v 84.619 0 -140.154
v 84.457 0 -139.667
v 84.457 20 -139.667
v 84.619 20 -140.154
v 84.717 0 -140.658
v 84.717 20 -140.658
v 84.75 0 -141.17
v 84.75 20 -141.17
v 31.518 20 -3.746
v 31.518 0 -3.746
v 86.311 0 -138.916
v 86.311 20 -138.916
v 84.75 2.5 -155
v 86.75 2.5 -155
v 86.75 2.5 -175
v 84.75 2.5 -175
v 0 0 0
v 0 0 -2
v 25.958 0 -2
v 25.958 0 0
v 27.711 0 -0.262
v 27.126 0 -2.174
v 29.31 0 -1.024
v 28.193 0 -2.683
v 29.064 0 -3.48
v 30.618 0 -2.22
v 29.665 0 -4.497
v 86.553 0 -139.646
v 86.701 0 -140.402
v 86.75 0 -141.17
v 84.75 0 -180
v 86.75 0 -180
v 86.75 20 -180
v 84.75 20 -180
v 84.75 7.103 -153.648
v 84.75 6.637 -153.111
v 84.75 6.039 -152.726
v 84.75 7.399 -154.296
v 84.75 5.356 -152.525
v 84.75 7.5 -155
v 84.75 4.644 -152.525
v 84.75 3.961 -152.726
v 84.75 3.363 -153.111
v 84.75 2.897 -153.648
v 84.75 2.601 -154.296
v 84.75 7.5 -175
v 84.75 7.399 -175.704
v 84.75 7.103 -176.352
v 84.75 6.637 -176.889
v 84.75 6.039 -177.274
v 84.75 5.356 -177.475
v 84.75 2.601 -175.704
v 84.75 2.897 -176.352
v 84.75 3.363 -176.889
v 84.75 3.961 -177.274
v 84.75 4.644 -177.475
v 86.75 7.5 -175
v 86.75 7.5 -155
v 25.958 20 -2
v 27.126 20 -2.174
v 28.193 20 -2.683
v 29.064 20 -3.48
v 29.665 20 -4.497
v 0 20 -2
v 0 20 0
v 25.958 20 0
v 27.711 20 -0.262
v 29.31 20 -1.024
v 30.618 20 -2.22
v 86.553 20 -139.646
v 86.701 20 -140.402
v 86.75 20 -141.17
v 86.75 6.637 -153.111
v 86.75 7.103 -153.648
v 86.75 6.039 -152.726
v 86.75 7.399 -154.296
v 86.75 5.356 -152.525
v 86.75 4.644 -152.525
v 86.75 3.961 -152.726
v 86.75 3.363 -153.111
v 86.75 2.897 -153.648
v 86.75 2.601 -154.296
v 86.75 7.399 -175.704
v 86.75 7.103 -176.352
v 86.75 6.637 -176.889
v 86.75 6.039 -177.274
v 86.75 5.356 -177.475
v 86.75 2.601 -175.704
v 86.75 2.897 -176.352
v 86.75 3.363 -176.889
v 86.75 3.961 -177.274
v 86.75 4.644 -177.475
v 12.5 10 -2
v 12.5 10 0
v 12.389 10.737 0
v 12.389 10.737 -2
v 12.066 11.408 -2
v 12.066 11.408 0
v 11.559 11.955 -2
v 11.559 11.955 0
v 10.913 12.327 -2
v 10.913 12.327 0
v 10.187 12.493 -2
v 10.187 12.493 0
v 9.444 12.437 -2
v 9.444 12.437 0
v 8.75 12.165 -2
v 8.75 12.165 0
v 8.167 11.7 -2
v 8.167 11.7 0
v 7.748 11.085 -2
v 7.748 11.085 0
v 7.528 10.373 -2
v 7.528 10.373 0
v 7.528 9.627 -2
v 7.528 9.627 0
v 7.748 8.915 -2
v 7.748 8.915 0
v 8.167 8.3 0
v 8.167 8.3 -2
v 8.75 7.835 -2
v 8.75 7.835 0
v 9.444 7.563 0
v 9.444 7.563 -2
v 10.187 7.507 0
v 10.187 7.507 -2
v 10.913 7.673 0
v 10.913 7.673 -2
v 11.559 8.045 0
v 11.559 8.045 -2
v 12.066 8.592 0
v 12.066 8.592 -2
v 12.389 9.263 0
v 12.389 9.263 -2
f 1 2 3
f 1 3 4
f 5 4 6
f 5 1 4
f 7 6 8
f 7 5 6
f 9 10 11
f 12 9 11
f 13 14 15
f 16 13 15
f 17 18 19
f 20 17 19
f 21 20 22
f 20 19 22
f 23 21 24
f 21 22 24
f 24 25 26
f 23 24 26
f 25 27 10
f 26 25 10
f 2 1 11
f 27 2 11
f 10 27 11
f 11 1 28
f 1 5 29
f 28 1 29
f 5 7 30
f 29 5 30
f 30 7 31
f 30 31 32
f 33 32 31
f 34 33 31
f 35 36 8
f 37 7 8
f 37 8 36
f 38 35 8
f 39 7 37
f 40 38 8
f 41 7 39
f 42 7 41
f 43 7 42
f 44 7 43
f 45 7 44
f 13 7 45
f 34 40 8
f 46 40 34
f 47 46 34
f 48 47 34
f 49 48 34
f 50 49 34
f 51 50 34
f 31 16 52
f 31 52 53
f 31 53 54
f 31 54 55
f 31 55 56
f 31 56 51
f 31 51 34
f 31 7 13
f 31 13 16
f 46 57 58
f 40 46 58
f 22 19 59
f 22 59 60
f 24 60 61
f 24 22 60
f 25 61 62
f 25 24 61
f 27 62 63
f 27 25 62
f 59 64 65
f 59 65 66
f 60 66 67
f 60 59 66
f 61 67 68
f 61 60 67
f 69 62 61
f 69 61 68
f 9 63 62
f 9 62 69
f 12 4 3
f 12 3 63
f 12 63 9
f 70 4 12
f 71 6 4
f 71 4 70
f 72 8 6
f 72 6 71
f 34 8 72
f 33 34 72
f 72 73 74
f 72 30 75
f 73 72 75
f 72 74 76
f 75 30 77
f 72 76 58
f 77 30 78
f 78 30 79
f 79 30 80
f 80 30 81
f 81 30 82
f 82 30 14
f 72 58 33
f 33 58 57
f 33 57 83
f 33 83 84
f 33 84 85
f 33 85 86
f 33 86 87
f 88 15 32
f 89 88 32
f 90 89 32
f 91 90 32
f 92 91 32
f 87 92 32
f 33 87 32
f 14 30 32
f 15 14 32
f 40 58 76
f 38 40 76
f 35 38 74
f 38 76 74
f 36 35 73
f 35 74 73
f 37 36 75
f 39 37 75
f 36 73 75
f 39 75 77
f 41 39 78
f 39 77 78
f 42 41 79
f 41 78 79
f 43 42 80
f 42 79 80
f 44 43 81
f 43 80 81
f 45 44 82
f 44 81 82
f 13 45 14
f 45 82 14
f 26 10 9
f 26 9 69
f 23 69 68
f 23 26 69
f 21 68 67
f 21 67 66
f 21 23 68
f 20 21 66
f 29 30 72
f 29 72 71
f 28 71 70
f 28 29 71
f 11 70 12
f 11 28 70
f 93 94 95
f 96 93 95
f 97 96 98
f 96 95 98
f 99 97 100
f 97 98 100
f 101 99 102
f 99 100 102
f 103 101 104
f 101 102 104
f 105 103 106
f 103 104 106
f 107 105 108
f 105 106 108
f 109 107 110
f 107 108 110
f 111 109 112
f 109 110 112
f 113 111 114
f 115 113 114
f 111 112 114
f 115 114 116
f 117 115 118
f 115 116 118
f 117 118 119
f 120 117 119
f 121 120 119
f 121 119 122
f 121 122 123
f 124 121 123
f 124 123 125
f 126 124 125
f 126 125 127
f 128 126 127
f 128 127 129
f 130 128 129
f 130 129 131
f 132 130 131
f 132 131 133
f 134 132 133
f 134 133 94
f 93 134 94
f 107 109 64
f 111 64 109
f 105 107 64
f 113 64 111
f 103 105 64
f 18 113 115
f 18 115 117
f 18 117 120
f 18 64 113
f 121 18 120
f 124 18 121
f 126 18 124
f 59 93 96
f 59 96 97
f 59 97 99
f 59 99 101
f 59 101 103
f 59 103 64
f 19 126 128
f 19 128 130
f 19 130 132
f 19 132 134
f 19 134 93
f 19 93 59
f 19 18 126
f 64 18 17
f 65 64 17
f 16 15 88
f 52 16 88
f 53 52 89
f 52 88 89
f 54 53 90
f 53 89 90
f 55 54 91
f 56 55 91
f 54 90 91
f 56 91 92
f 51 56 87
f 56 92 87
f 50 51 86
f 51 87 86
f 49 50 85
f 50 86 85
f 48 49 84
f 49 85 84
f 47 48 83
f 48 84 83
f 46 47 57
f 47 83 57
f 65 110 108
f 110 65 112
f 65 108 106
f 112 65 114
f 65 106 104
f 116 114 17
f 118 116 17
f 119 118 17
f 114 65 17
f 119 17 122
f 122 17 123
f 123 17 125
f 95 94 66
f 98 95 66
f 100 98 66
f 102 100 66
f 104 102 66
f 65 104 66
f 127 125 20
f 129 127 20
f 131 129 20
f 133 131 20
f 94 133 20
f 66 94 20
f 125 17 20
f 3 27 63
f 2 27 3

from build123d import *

# Parameters (mm, degrees)
BOSS_EXTRUDE1_DEPTH  = 20
CONVERT_SOLID2_DEPTH = 20
SKETCH8_R            = 2.5
CUT_EXTRUDE1_DEPTH   = 20
CUT_EXTRUDE2_DEPTH   = 10


# Read off the part's stored shape, not the designer's step: Convert-Solid2
with BuildPart() as part:
    # Sketch1 → Boss-Extrude1 (new body)
    with BuildSketch(Plane(origin=(0, 0, 0), x_dir=(1, 0, 0), z_dir=(0, 1, 0))):
        Polygon((0, 0), (30, 0), (86.75, 140), (86.75, 180), (81.75, 180), (81.75, 140.974868952), (26.631615621, 5), (0, 5), align=None)
    extrude(amount=BOSS_EXTRUDE1_DEPTH)

    # Convert-Solid2 outline → Convert-Solid2 (cut)
    with BuildSketch(Plane(origin=(0, 0, 0), x_dir=(1, 0, 0), z_dir=(0, 1, 0))):
        with BuildLine():
            Line((30, 0), (31.51846779, 3.745999834))
            ThreePointArc((31.51846779, 3.745999834), (29.310251306, 1.023856865), (25.957938746, 0))
            Line((25.957938746, 0), (30, 0))
        make_face()
        with BuildLine():
            ThreePointArc((86.75, 141.169842742), (86.639107499, 140.021621131), (86.310529044, 138.915842576))
            Line((86.310529044, 138.915842576), (86.75, 140))
            Line((86.75, 140), (86.75, 141.169842742))
        make_face()
        with BuildLine():
            Line((0, 5), (0, 2))
            Line((0, 2), (25.957938746, 2))
            ThreePointArc((25.957938746, 2), (28.192813786, 2.682571243), (29.664958108, 4.497333223))
            Line((29.664958108, 4.497333223), (84.457019363, 139.667175965))
            ThreePointArc((84.457019363, 139.667175965), (84.676071666, 140.404361668), (84.75, 141.169842742))
            Line((84.75, 141.169842742), (84.75, 180))
            Line((84.75, 180), (81.75, 180))
            Line((81.75, 180), (81.75, 140.974868952))
            Line((81.75, 140.974868952), (26.631615621, 5))
            Line((26.631615621, 5), (0, 5))
        make_face()
    extrude(amount=CONVERT_SOLID2_DEPTH, mode=Mode.SUBTRACT)

    # Sketch8 → Cut-Extrude1 (cut)
    with BuildSketch(Plane.XY):
        with Locations((10, 10)):
            Circle(SKETCH8_R)
    extrude(amount=-CUT_EXTRUDE1_DEPTH, mode=Mode.SUBTRACT)

    # Sketch9 → Cut-Extrude2 (cut)
    with BuildSketch(Plane(origin=(86.75, 0, -320.372504423), x_dir=(0, 0, 1), z_dir=(-1, 0, 0))):
        with BuildLine():
            Line((145.372504423, 7.5), (165.372504423, 7.5))
            ThreePointArc((165.372504423, 7.5), (167.872504423, 5), (165.372504423, 2.5))
            Line((165.372504423, 2.5), (145.372504423, 2.5))
            ThreePointArc((145.372504423, 2.5), (142.872504423, 5), (145.372504423, 7.5))
        make_face()
    extrude(amount=CUT_EXTRUDE2_DEPTH, mode=Mode.SUBTRACT)


solid = part.part
